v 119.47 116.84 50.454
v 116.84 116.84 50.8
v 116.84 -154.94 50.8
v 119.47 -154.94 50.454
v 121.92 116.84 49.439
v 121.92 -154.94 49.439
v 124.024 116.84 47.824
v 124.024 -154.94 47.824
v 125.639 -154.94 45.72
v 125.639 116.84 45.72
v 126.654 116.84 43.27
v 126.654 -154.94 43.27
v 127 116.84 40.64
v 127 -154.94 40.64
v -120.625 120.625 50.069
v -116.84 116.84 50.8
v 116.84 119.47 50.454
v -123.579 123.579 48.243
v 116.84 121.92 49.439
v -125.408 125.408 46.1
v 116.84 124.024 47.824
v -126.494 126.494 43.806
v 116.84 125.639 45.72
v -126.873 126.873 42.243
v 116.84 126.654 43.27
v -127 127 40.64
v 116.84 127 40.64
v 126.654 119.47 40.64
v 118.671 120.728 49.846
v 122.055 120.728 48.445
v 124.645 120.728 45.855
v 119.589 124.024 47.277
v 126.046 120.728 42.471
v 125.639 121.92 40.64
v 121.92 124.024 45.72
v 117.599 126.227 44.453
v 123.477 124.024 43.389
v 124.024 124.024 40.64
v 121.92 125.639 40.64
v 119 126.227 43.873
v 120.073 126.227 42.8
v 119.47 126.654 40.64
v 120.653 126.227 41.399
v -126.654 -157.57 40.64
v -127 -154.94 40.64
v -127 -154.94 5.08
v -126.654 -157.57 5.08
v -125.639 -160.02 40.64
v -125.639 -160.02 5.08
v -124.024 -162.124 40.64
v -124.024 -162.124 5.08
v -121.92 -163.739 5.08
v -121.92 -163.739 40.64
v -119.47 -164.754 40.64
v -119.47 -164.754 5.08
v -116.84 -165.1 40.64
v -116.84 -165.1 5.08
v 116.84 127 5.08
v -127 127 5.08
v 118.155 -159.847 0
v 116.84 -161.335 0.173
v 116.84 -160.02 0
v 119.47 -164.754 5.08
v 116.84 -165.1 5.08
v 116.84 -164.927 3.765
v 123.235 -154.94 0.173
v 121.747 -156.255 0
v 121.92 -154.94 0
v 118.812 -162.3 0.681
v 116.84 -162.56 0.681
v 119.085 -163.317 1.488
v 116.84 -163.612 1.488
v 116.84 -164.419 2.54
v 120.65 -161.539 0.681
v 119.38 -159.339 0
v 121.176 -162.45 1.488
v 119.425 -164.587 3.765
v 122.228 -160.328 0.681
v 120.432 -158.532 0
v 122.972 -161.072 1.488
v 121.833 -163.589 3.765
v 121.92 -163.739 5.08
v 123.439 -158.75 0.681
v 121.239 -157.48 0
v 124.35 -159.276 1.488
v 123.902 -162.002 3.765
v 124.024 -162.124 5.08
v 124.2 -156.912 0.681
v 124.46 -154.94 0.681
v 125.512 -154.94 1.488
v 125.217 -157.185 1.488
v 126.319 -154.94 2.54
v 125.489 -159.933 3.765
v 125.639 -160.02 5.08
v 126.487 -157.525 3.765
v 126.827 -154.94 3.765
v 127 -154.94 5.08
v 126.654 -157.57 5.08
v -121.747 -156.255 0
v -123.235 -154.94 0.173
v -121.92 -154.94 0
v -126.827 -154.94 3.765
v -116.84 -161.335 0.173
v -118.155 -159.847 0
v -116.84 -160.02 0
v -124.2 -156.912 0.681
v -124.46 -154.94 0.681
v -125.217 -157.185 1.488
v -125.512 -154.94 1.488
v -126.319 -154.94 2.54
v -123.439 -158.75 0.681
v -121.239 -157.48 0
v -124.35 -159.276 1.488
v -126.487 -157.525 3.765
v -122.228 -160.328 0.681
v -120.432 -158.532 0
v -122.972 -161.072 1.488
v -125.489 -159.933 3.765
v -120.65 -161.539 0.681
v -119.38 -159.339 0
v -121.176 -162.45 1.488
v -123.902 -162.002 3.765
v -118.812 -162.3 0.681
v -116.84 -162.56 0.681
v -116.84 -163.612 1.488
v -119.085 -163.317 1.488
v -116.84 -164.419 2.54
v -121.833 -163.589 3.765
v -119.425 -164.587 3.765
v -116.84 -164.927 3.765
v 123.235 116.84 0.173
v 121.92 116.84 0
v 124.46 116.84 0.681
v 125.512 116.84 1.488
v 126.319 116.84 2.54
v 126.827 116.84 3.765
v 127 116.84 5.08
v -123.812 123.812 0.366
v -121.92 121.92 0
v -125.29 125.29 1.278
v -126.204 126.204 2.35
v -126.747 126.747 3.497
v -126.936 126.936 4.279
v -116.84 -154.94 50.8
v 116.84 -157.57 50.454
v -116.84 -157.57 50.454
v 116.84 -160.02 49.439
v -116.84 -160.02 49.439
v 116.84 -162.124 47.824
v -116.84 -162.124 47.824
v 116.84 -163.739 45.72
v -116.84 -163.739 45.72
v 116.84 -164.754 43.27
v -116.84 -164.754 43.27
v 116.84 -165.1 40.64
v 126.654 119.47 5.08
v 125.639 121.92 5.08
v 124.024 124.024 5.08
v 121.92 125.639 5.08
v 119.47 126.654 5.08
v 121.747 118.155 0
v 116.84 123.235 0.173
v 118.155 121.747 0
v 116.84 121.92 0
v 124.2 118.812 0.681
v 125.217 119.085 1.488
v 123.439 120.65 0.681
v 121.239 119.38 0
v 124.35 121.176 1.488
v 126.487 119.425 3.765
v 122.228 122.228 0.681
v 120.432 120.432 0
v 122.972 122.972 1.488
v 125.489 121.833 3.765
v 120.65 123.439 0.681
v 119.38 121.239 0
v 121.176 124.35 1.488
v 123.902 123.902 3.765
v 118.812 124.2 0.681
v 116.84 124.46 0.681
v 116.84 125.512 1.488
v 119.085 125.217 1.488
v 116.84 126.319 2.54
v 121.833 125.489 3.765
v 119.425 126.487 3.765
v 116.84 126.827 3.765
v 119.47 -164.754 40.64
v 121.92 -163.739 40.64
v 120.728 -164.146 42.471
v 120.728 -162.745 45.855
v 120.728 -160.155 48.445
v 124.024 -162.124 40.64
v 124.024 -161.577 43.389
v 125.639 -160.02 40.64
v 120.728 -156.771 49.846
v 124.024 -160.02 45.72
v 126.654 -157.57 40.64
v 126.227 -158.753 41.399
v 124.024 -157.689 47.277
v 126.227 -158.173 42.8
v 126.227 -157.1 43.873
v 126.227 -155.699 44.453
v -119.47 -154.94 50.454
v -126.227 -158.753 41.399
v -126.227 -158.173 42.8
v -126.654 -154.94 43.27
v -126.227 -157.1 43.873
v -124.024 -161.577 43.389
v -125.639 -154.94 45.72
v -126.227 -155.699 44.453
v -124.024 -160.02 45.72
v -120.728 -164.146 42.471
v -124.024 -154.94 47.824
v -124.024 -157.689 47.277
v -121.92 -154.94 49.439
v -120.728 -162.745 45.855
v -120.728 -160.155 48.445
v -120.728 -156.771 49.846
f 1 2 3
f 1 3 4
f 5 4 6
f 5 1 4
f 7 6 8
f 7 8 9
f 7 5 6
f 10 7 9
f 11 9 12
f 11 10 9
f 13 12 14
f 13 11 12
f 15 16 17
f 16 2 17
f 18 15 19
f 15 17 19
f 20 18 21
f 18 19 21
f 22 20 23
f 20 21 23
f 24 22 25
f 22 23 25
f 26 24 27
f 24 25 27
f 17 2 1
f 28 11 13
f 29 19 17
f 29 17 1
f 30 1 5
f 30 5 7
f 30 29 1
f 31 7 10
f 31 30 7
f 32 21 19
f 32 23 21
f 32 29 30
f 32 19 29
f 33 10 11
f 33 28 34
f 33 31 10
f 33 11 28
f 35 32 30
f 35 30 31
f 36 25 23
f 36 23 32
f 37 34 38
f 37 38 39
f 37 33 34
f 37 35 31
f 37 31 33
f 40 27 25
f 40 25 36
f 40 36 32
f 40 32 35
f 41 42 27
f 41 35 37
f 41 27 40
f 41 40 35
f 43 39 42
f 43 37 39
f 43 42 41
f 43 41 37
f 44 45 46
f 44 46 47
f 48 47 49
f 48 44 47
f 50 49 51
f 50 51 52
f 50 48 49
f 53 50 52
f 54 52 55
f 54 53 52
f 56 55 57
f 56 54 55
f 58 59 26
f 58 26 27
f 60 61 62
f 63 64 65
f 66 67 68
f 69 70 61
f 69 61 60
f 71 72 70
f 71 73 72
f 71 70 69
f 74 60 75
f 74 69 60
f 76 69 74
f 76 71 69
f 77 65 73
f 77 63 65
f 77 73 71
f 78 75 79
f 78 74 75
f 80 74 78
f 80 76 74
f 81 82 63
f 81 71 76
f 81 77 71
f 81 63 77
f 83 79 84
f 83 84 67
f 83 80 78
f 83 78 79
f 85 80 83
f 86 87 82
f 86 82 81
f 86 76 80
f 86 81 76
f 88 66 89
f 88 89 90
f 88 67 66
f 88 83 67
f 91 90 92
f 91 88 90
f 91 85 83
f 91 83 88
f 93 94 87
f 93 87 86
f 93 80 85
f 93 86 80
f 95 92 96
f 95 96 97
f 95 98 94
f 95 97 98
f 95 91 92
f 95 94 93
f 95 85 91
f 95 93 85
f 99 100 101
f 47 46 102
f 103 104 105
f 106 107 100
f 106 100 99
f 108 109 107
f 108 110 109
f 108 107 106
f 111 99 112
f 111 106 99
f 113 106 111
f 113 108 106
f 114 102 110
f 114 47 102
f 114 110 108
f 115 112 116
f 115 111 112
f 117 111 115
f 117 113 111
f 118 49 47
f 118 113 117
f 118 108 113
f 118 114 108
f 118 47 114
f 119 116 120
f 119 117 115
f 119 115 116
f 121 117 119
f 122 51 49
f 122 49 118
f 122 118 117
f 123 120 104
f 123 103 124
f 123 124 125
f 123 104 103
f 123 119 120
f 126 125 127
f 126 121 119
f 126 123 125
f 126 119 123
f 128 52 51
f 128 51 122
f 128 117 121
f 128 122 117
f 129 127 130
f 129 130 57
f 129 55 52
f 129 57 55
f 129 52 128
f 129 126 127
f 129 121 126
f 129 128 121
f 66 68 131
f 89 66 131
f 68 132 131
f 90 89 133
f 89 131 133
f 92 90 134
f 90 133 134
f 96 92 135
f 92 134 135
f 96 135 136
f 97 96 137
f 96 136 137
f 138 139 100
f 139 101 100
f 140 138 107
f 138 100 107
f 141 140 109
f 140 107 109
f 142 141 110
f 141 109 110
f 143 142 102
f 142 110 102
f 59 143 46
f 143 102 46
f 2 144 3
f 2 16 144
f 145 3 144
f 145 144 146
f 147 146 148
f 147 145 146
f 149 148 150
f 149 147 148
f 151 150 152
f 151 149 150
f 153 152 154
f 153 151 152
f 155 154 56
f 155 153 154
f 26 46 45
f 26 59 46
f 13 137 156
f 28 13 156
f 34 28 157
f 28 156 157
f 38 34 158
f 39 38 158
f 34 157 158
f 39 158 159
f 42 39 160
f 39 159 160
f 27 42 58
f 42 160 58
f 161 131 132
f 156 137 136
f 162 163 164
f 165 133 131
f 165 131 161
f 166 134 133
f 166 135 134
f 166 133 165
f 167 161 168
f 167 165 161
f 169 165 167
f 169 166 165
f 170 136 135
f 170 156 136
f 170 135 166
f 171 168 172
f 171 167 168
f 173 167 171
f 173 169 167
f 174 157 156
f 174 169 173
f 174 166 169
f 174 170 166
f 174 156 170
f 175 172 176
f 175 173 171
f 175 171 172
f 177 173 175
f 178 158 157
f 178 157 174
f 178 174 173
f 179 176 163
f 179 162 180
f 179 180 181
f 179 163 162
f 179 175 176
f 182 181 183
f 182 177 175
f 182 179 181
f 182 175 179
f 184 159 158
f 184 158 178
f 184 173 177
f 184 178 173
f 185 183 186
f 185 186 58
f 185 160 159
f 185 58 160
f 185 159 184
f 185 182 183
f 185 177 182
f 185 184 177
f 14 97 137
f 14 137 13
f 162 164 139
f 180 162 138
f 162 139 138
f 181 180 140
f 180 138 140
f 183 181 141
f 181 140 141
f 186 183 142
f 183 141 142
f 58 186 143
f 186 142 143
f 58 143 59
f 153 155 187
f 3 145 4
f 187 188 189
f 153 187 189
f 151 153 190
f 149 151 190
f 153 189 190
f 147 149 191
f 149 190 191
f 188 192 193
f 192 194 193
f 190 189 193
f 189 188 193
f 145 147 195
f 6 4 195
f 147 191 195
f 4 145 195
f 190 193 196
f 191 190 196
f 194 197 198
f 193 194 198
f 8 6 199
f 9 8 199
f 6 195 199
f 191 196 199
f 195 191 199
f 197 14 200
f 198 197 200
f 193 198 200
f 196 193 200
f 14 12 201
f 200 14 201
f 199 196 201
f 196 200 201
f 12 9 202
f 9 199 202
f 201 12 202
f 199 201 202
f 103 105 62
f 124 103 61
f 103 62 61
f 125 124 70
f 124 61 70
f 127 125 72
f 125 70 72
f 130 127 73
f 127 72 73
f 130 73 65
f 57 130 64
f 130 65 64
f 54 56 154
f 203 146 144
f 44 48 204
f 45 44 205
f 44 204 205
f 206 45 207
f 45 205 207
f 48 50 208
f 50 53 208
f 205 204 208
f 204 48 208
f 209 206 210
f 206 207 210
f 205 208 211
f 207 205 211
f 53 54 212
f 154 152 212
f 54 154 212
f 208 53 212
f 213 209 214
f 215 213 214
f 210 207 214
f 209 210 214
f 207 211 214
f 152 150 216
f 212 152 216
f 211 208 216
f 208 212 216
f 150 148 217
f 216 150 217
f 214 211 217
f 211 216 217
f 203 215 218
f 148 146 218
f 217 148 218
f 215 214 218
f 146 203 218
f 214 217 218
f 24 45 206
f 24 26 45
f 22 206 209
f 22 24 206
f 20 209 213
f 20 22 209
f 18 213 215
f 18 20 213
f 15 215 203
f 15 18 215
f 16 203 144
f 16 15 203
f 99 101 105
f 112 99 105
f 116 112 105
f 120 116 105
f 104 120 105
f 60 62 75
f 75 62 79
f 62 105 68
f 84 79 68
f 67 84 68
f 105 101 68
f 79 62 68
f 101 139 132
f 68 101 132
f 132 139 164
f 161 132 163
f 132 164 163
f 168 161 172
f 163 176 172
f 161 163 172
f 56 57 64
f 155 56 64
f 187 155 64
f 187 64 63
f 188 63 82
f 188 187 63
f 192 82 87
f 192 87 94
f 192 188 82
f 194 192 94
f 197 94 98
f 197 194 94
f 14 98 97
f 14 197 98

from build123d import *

# Parameters (mm, degrees)
F0_W     = 254
F0_H     = 254
F1_DEPTH = 50.8
F2_DEPTH = 38.1
F3_R     = 10.16
F4_R     = 10.16
F5_R     = 10.16
F6_R     = 5.08


with BuildPart() as f1:
    # F0 (on Top) → F1 (new body)
    with BuildSketch(Plane.XY):
        Rectangle(F0_W, F0_H)
    extrude(amount=F1_DEPTH)

    # F2 (add): a face of the model
    f2_faces = [f1.faces().sort_by_distance(p)[0] for p in [
        (0, -127, 25.4),
    ]]
    extrude(f2_faces, amount=F2_DEPTH)

    # F3
    f3_edges = [f1.edges().sort_by_distance(p)[0] for p in [
        (0, -165.1, 50.8),
    ]]
    fillet(f3_edges, radius=F3_R)

    # F4
    f4_edges = [f1.edges().sort_by_distance(p)[0] for p in [
        (127, -13.97, 50.8),
    ]]
    fillet(f4_edges, radius=F4_R)

    # F5
    f5_edges = [f1.edges().sort_by_distance(p)[0] for p in [
        (-5.08, 127, 50.8),
        (-127, -13.97, 50.8),
    ]]
    fillet(f5_edges, radius=F5_R)

    # F6
    f6_edges = [f1.edges().sort_by_distance(p)[0] for p in [
        (-127, -13.97, 0),
        (-5.08, 127, 0),
        (127, -19.05, 0),
        (0, -165.1, 0),
    ]]
    fillet(f6_edges, radius=F6_R)


solid = f1.part
